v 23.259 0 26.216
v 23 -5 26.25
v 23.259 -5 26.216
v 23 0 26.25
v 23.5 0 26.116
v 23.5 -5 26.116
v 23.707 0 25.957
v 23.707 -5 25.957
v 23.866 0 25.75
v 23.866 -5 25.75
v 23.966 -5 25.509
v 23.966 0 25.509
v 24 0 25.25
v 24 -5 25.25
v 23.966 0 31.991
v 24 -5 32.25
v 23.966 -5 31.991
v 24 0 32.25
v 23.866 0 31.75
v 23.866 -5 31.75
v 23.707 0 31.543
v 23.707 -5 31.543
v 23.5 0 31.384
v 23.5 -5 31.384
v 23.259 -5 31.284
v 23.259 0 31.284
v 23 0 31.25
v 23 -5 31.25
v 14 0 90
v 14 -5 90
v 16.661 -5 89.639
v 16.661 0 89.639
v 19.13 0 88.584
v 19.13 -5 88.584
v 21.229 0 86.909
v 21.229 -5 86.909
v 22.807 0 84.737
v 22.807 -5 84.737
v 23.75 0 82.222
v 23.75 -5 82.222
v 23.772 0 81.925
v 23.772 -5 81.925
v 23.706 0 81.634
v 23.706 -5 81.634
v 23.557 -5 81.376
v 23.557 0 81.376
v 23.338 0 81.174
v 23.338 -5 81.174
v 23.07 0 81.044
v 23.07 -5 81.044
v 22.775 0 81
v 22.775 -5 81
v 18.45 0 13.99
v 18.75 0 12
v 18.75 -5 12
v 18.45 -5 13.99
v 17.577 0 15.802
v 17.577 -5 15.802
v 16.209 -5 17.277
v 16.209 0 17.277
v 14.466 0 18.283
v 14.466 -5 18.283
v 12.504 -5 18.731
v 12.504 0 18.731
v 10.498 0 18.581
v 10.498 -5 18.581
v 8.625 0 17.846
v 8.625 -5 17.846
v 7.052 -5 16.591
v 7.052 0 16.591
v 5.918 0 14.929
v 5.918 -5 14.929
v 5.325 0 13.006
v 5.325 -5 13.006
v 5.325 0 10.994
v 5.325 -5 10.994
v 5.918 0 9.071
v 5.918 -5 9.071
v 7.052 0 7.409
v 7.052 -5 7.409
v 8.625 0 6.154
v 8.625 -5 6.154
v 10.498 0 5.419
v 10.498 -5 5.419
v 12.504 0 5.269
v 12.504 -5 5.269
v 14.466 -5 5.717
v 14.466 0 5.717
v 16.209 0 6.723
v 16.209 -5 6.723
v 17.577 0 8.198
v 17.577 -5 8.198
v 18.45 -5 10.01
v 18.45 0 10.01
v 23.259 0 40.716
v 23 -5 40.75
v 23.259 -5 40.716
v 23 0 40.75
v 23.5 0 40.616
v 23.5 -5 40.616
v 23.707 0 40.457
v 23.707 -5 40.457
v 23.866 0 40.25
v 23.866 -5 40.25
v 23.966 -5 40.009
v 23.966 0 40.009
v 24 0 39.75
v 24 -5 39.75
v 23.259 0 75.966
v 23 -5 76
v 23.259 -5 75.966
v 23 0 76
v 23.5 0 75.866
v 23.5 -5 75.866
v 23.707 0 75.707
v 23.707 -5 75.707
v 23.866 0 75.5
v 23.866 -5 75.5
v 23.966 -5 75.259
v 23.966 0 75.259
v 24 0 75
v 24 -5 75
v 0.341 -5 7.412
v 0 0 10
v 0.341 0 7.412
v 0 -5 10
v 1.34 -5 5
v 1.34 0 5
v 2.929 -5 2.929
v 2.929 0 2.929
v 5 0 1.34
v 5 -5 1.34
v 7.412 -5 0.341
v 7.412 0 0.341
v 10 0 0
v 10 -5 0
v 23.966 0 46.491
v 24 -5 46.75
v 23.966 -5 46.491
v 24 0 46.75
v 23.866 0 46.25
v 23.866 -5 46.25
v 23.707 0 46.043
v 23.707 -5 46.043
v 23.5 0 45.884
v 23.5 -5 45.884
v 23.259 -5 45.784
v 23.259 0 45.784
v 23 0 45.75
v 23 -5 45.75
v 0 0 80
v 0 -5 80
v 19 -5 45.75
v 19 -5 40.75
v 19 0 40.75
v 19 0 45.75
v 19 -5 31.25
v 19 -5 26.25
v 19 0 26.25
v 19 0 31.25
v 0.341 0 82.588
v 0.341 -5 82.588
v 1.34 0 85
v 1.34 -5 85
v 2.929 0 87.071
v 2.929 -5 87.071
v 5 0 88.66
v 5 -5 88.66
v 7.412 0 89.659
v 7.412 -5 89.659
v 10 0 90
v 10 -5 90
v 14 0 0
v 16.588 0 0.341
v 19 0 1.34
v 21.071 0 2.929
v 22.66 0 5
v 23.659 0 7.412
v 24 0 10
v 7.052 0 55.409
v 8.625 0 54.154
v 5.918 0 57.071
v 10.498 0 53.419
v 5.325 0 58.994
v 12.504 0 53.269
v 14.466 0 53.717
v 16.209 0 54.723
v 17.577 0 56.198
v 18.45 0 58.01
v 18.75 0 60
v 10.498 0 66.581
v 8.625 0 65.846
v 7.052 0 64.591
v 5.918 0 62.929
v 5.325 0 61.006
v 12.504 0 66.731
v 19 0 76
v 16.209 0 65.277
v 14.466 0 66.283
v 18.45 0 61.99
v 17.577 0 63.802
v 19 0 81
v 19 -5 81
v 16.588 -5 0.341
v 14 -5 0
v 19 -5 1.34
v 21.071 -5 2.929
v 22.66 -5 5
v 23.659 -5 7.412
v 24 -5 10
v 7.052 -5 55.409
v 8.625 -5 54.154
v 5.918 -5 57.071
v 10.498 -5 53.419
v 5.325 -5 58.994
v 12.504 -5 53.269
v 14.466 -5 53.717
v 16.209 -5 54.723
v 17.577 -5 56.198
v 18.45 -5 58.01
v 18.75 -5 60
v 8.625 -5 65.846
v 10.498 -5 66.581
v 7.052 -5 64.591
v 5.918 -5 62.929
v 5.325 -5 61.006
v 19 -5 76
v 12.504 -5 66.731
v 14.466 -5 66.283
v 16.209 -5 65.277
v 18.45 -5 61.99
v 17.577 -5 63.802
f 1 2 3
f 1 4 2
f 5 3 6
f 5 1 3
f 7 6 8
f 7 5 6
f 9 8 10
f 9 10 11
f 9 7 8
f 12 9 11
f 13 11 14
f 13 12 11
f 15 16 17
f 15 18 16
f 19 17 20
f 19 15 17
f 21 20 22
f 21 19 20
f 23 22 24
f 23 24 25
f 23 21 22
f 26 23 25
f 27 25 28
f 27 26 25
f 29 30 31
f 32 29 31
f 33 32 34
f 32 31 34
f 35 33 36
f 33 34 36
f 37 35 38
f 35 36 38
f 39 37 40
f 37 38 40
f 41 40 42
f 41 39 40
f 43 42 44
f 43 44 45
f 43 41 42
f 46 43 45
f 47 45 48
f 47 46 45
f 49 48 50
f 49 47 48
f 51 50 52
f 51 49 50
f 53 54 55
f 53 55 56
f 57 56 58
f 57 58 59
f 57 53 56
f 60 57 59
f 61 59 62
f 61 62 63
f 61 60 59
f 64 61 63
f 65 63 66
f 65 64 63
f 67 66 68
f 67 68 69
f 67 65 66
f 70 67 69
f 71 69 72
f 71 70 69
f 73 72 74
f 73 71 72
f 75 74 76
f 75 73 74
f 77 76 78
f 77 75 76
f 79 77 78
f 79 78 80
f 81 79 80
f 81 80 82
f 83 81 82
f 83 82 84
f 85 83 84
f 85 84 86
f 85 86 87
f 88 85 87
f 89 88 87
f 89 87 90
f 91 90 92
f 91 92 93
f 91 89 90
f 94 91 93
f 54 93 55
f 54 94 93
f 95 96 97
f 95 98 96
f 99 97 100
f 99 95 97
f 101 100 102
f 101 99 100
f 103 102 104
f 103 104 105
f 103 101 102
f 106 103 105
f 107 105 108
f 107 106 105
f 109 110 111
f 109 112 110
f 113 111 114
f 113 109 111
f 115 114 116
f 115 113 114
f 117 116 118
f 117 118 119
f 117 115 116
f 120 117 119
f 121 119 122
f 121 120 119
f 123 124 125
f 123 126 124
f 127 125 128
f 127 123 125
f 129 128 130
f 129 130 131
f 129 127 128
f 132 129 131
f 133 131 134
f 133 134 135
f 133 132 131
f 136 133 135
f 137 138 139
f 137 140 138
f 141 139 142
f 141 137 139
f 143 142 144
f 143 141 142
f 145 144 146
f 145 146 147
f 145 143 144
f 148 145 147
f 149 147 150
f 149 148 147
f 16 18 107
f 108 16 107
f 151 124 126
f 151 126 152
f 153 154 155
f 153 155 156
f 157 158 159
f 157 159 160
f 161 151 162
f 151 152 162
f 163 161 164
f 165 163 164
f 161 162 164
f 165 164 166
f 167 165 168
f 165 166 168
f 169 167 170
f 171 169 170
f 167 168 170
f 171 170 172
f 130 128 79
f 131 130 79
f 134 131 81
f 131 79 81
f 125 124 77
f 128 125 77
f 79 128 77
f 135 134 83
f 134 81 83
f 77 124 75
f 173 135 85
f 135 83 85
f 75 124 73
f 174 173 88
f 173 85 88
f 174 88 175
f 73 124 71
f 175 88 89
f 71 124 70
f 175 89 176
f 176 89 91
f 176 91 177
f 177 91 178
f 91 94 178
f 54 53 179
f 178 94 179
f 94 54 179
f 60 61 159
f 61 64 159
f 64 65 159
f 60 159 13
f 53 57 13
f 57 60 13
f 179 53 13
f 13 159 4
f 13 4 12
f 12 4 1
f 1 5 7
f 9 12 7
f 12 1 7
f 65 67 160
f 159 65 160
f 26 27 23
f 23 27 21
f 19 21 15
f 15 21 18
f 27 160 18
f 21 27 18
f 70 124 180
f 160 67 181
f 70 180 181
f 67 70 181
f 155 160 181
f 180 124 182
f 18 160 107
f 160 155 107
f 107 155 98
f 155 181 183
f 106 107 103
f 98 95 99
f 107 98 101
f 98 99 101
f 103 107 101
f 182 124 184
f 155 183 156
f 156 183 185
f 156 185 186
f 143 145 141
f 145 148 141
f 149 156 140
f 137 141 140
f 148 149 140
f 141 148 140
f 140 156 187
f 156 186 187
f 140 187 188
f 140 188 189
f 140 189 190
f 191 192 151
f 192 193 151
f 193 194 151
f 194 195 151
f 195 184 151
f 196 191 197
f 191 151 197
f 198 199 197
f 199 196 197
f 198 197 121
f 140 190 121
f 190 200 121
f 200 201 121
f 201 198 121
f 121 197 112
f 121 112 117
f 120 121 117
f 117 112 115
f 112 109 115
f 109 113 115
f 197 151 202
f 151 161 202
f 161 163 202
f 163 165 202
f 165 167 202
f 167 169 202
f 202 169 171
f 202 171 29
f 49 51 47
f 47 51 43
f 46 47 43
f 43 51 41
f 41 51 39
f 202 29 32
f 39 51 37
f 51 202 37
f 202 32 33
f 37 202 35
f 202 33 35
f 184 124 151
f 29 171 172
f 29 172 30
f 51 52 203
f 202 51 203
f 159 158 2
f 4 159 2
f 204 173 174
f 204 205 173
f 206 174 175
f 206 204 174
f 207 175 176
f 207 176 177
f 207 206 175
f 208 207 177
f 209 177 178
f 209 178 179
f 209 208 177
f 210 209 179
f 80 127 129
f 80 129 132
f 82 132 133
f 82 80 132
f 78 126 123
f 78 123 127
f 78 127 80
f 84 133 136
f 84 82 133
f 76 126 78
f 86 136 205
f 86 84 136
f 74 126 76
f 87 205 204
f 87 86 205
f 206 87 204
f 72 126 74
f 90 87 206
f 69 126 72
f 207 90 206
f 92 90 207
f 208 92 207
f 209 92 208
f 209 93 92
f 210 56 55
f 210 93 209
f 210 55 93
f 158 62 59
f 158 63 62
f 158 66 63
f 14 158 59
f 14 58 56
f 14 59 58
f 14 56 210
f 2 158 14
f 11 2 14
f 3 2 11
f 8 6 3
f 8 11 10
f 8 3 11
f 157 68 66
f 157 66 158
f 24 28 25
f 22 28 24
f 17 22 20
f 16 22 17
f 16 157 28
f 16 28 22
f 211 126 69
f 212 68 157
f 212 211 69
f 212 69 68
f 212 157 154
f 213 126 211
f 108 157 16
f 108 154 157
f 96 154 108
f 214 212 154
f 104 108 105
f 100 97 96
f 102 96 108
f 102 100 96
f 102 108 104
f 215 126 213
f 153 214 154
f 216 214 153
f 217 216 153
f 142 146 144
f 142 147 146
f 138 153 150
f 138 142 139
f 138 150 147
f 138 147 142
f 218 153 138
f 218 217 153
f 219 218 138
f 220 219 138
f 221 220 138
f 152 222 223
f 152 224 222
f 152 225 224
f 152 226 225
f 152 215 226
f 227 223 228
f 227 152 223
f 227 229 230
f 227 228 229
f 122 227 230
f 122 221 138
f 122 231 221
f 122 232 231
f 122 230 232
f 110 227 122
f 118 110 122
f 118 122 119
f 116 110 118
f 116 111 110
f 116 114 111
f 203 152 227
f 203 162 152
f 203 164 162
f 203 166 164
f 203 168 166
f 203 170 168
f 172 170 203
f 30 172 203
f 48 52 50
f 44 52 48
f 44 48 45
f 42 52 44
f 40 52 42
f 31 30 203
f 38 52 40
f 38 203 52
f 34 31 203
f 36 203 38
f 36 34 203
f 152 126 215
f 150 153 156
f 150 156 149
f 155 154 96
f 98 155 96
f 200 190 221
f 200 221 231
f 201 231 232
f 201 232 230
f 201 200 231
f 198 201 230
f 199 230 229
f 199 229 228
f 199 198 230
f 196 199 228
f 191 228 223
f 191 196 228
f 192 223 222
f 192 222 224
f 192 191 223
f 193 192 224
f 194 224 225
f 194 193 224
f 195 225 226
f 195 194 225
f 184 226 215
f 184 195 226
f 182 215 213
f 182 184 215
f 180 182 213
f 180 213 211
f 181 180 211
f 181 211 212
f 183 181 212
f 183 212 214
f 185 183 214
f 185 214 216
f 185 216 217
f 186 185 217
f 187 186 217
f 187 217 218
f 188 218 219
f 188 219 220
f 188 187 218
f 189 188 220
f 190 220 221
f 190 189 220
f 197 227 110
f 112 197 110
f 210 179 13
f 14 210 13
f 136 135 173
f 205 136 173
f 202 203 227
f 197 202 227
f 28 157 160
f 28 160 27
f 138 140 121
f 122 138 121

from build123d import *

# Parameters (mm, degrees)
F2_W     = 24
F2_H     = 90
F2_R     = 6.75
F3_DEPTH = 5
F4_R     = 10
F5_W     = 5
F5_H     = 5
F6_DEPTH = 25
F7_R     = 1


with BuildPart() as f3:
    # F2 (on Front) → F3 (new body)
    with BuildSketch(Plane.XZ):
        with Locations((12, 45)):
            Rectangle(F2_W, F2_H)
        with Locations((12, 12)):
            Circle(F2_R, mode=Mode.SUBTRACT)
        with Locations((12, 60)):
            Circle(F2_R, mode=Mode.SUBTRACT)
    extrude(amount=F3_DEPTH)

    # F4
    f4_edges = [f3.edges().sort_by_distance(p)[0] for p in [
        (0, -2.5, 90),
        (0, -2.5, 0),
        (24, -2.5, 90),
        (24, -2.5, 0),
    ]]
    fillet(f4_edges, radius=F4_R)

    # F5 (on face) → F6 (cut)
    with BuildSketch(Plane.XZ.offset(5)):
        with BuildLine():
            Line((19, 81), (19, 76))
            Line((19, 76), (24, 76))
            Line((24, 76), (24, 80))
            ThreePointArc((24, 80), (23.9874607311, 80.5006277506), (23.9498743711, 81))
            Line((23.9498743711, 81), (19, 81))
        make_face()
        with Locations((21.5, 43.25)):
            Rectangle(F5_W, F5_H)
        with Locations((21.5, 28.75)):
            Rectangle(F5_W, F5_H)
    extrude(amount=-F6_DEPTH, mode=Mode.SUBTRACT)

    # F7
    f7_edges = [f3.edges().sort_by_distance(p)[0] for p in [
        (24, -2.5, 26.25),
        (24, -2.5, 31.25),
        (24, -2.5, 40.75),
        (24, -2.5, 45.75),
        (24, -2.5, 76),
        (23.949874, -2.5, 81),
    ]]
    fillet(f7_edges, radius=F7_R)


solid = f3.part
